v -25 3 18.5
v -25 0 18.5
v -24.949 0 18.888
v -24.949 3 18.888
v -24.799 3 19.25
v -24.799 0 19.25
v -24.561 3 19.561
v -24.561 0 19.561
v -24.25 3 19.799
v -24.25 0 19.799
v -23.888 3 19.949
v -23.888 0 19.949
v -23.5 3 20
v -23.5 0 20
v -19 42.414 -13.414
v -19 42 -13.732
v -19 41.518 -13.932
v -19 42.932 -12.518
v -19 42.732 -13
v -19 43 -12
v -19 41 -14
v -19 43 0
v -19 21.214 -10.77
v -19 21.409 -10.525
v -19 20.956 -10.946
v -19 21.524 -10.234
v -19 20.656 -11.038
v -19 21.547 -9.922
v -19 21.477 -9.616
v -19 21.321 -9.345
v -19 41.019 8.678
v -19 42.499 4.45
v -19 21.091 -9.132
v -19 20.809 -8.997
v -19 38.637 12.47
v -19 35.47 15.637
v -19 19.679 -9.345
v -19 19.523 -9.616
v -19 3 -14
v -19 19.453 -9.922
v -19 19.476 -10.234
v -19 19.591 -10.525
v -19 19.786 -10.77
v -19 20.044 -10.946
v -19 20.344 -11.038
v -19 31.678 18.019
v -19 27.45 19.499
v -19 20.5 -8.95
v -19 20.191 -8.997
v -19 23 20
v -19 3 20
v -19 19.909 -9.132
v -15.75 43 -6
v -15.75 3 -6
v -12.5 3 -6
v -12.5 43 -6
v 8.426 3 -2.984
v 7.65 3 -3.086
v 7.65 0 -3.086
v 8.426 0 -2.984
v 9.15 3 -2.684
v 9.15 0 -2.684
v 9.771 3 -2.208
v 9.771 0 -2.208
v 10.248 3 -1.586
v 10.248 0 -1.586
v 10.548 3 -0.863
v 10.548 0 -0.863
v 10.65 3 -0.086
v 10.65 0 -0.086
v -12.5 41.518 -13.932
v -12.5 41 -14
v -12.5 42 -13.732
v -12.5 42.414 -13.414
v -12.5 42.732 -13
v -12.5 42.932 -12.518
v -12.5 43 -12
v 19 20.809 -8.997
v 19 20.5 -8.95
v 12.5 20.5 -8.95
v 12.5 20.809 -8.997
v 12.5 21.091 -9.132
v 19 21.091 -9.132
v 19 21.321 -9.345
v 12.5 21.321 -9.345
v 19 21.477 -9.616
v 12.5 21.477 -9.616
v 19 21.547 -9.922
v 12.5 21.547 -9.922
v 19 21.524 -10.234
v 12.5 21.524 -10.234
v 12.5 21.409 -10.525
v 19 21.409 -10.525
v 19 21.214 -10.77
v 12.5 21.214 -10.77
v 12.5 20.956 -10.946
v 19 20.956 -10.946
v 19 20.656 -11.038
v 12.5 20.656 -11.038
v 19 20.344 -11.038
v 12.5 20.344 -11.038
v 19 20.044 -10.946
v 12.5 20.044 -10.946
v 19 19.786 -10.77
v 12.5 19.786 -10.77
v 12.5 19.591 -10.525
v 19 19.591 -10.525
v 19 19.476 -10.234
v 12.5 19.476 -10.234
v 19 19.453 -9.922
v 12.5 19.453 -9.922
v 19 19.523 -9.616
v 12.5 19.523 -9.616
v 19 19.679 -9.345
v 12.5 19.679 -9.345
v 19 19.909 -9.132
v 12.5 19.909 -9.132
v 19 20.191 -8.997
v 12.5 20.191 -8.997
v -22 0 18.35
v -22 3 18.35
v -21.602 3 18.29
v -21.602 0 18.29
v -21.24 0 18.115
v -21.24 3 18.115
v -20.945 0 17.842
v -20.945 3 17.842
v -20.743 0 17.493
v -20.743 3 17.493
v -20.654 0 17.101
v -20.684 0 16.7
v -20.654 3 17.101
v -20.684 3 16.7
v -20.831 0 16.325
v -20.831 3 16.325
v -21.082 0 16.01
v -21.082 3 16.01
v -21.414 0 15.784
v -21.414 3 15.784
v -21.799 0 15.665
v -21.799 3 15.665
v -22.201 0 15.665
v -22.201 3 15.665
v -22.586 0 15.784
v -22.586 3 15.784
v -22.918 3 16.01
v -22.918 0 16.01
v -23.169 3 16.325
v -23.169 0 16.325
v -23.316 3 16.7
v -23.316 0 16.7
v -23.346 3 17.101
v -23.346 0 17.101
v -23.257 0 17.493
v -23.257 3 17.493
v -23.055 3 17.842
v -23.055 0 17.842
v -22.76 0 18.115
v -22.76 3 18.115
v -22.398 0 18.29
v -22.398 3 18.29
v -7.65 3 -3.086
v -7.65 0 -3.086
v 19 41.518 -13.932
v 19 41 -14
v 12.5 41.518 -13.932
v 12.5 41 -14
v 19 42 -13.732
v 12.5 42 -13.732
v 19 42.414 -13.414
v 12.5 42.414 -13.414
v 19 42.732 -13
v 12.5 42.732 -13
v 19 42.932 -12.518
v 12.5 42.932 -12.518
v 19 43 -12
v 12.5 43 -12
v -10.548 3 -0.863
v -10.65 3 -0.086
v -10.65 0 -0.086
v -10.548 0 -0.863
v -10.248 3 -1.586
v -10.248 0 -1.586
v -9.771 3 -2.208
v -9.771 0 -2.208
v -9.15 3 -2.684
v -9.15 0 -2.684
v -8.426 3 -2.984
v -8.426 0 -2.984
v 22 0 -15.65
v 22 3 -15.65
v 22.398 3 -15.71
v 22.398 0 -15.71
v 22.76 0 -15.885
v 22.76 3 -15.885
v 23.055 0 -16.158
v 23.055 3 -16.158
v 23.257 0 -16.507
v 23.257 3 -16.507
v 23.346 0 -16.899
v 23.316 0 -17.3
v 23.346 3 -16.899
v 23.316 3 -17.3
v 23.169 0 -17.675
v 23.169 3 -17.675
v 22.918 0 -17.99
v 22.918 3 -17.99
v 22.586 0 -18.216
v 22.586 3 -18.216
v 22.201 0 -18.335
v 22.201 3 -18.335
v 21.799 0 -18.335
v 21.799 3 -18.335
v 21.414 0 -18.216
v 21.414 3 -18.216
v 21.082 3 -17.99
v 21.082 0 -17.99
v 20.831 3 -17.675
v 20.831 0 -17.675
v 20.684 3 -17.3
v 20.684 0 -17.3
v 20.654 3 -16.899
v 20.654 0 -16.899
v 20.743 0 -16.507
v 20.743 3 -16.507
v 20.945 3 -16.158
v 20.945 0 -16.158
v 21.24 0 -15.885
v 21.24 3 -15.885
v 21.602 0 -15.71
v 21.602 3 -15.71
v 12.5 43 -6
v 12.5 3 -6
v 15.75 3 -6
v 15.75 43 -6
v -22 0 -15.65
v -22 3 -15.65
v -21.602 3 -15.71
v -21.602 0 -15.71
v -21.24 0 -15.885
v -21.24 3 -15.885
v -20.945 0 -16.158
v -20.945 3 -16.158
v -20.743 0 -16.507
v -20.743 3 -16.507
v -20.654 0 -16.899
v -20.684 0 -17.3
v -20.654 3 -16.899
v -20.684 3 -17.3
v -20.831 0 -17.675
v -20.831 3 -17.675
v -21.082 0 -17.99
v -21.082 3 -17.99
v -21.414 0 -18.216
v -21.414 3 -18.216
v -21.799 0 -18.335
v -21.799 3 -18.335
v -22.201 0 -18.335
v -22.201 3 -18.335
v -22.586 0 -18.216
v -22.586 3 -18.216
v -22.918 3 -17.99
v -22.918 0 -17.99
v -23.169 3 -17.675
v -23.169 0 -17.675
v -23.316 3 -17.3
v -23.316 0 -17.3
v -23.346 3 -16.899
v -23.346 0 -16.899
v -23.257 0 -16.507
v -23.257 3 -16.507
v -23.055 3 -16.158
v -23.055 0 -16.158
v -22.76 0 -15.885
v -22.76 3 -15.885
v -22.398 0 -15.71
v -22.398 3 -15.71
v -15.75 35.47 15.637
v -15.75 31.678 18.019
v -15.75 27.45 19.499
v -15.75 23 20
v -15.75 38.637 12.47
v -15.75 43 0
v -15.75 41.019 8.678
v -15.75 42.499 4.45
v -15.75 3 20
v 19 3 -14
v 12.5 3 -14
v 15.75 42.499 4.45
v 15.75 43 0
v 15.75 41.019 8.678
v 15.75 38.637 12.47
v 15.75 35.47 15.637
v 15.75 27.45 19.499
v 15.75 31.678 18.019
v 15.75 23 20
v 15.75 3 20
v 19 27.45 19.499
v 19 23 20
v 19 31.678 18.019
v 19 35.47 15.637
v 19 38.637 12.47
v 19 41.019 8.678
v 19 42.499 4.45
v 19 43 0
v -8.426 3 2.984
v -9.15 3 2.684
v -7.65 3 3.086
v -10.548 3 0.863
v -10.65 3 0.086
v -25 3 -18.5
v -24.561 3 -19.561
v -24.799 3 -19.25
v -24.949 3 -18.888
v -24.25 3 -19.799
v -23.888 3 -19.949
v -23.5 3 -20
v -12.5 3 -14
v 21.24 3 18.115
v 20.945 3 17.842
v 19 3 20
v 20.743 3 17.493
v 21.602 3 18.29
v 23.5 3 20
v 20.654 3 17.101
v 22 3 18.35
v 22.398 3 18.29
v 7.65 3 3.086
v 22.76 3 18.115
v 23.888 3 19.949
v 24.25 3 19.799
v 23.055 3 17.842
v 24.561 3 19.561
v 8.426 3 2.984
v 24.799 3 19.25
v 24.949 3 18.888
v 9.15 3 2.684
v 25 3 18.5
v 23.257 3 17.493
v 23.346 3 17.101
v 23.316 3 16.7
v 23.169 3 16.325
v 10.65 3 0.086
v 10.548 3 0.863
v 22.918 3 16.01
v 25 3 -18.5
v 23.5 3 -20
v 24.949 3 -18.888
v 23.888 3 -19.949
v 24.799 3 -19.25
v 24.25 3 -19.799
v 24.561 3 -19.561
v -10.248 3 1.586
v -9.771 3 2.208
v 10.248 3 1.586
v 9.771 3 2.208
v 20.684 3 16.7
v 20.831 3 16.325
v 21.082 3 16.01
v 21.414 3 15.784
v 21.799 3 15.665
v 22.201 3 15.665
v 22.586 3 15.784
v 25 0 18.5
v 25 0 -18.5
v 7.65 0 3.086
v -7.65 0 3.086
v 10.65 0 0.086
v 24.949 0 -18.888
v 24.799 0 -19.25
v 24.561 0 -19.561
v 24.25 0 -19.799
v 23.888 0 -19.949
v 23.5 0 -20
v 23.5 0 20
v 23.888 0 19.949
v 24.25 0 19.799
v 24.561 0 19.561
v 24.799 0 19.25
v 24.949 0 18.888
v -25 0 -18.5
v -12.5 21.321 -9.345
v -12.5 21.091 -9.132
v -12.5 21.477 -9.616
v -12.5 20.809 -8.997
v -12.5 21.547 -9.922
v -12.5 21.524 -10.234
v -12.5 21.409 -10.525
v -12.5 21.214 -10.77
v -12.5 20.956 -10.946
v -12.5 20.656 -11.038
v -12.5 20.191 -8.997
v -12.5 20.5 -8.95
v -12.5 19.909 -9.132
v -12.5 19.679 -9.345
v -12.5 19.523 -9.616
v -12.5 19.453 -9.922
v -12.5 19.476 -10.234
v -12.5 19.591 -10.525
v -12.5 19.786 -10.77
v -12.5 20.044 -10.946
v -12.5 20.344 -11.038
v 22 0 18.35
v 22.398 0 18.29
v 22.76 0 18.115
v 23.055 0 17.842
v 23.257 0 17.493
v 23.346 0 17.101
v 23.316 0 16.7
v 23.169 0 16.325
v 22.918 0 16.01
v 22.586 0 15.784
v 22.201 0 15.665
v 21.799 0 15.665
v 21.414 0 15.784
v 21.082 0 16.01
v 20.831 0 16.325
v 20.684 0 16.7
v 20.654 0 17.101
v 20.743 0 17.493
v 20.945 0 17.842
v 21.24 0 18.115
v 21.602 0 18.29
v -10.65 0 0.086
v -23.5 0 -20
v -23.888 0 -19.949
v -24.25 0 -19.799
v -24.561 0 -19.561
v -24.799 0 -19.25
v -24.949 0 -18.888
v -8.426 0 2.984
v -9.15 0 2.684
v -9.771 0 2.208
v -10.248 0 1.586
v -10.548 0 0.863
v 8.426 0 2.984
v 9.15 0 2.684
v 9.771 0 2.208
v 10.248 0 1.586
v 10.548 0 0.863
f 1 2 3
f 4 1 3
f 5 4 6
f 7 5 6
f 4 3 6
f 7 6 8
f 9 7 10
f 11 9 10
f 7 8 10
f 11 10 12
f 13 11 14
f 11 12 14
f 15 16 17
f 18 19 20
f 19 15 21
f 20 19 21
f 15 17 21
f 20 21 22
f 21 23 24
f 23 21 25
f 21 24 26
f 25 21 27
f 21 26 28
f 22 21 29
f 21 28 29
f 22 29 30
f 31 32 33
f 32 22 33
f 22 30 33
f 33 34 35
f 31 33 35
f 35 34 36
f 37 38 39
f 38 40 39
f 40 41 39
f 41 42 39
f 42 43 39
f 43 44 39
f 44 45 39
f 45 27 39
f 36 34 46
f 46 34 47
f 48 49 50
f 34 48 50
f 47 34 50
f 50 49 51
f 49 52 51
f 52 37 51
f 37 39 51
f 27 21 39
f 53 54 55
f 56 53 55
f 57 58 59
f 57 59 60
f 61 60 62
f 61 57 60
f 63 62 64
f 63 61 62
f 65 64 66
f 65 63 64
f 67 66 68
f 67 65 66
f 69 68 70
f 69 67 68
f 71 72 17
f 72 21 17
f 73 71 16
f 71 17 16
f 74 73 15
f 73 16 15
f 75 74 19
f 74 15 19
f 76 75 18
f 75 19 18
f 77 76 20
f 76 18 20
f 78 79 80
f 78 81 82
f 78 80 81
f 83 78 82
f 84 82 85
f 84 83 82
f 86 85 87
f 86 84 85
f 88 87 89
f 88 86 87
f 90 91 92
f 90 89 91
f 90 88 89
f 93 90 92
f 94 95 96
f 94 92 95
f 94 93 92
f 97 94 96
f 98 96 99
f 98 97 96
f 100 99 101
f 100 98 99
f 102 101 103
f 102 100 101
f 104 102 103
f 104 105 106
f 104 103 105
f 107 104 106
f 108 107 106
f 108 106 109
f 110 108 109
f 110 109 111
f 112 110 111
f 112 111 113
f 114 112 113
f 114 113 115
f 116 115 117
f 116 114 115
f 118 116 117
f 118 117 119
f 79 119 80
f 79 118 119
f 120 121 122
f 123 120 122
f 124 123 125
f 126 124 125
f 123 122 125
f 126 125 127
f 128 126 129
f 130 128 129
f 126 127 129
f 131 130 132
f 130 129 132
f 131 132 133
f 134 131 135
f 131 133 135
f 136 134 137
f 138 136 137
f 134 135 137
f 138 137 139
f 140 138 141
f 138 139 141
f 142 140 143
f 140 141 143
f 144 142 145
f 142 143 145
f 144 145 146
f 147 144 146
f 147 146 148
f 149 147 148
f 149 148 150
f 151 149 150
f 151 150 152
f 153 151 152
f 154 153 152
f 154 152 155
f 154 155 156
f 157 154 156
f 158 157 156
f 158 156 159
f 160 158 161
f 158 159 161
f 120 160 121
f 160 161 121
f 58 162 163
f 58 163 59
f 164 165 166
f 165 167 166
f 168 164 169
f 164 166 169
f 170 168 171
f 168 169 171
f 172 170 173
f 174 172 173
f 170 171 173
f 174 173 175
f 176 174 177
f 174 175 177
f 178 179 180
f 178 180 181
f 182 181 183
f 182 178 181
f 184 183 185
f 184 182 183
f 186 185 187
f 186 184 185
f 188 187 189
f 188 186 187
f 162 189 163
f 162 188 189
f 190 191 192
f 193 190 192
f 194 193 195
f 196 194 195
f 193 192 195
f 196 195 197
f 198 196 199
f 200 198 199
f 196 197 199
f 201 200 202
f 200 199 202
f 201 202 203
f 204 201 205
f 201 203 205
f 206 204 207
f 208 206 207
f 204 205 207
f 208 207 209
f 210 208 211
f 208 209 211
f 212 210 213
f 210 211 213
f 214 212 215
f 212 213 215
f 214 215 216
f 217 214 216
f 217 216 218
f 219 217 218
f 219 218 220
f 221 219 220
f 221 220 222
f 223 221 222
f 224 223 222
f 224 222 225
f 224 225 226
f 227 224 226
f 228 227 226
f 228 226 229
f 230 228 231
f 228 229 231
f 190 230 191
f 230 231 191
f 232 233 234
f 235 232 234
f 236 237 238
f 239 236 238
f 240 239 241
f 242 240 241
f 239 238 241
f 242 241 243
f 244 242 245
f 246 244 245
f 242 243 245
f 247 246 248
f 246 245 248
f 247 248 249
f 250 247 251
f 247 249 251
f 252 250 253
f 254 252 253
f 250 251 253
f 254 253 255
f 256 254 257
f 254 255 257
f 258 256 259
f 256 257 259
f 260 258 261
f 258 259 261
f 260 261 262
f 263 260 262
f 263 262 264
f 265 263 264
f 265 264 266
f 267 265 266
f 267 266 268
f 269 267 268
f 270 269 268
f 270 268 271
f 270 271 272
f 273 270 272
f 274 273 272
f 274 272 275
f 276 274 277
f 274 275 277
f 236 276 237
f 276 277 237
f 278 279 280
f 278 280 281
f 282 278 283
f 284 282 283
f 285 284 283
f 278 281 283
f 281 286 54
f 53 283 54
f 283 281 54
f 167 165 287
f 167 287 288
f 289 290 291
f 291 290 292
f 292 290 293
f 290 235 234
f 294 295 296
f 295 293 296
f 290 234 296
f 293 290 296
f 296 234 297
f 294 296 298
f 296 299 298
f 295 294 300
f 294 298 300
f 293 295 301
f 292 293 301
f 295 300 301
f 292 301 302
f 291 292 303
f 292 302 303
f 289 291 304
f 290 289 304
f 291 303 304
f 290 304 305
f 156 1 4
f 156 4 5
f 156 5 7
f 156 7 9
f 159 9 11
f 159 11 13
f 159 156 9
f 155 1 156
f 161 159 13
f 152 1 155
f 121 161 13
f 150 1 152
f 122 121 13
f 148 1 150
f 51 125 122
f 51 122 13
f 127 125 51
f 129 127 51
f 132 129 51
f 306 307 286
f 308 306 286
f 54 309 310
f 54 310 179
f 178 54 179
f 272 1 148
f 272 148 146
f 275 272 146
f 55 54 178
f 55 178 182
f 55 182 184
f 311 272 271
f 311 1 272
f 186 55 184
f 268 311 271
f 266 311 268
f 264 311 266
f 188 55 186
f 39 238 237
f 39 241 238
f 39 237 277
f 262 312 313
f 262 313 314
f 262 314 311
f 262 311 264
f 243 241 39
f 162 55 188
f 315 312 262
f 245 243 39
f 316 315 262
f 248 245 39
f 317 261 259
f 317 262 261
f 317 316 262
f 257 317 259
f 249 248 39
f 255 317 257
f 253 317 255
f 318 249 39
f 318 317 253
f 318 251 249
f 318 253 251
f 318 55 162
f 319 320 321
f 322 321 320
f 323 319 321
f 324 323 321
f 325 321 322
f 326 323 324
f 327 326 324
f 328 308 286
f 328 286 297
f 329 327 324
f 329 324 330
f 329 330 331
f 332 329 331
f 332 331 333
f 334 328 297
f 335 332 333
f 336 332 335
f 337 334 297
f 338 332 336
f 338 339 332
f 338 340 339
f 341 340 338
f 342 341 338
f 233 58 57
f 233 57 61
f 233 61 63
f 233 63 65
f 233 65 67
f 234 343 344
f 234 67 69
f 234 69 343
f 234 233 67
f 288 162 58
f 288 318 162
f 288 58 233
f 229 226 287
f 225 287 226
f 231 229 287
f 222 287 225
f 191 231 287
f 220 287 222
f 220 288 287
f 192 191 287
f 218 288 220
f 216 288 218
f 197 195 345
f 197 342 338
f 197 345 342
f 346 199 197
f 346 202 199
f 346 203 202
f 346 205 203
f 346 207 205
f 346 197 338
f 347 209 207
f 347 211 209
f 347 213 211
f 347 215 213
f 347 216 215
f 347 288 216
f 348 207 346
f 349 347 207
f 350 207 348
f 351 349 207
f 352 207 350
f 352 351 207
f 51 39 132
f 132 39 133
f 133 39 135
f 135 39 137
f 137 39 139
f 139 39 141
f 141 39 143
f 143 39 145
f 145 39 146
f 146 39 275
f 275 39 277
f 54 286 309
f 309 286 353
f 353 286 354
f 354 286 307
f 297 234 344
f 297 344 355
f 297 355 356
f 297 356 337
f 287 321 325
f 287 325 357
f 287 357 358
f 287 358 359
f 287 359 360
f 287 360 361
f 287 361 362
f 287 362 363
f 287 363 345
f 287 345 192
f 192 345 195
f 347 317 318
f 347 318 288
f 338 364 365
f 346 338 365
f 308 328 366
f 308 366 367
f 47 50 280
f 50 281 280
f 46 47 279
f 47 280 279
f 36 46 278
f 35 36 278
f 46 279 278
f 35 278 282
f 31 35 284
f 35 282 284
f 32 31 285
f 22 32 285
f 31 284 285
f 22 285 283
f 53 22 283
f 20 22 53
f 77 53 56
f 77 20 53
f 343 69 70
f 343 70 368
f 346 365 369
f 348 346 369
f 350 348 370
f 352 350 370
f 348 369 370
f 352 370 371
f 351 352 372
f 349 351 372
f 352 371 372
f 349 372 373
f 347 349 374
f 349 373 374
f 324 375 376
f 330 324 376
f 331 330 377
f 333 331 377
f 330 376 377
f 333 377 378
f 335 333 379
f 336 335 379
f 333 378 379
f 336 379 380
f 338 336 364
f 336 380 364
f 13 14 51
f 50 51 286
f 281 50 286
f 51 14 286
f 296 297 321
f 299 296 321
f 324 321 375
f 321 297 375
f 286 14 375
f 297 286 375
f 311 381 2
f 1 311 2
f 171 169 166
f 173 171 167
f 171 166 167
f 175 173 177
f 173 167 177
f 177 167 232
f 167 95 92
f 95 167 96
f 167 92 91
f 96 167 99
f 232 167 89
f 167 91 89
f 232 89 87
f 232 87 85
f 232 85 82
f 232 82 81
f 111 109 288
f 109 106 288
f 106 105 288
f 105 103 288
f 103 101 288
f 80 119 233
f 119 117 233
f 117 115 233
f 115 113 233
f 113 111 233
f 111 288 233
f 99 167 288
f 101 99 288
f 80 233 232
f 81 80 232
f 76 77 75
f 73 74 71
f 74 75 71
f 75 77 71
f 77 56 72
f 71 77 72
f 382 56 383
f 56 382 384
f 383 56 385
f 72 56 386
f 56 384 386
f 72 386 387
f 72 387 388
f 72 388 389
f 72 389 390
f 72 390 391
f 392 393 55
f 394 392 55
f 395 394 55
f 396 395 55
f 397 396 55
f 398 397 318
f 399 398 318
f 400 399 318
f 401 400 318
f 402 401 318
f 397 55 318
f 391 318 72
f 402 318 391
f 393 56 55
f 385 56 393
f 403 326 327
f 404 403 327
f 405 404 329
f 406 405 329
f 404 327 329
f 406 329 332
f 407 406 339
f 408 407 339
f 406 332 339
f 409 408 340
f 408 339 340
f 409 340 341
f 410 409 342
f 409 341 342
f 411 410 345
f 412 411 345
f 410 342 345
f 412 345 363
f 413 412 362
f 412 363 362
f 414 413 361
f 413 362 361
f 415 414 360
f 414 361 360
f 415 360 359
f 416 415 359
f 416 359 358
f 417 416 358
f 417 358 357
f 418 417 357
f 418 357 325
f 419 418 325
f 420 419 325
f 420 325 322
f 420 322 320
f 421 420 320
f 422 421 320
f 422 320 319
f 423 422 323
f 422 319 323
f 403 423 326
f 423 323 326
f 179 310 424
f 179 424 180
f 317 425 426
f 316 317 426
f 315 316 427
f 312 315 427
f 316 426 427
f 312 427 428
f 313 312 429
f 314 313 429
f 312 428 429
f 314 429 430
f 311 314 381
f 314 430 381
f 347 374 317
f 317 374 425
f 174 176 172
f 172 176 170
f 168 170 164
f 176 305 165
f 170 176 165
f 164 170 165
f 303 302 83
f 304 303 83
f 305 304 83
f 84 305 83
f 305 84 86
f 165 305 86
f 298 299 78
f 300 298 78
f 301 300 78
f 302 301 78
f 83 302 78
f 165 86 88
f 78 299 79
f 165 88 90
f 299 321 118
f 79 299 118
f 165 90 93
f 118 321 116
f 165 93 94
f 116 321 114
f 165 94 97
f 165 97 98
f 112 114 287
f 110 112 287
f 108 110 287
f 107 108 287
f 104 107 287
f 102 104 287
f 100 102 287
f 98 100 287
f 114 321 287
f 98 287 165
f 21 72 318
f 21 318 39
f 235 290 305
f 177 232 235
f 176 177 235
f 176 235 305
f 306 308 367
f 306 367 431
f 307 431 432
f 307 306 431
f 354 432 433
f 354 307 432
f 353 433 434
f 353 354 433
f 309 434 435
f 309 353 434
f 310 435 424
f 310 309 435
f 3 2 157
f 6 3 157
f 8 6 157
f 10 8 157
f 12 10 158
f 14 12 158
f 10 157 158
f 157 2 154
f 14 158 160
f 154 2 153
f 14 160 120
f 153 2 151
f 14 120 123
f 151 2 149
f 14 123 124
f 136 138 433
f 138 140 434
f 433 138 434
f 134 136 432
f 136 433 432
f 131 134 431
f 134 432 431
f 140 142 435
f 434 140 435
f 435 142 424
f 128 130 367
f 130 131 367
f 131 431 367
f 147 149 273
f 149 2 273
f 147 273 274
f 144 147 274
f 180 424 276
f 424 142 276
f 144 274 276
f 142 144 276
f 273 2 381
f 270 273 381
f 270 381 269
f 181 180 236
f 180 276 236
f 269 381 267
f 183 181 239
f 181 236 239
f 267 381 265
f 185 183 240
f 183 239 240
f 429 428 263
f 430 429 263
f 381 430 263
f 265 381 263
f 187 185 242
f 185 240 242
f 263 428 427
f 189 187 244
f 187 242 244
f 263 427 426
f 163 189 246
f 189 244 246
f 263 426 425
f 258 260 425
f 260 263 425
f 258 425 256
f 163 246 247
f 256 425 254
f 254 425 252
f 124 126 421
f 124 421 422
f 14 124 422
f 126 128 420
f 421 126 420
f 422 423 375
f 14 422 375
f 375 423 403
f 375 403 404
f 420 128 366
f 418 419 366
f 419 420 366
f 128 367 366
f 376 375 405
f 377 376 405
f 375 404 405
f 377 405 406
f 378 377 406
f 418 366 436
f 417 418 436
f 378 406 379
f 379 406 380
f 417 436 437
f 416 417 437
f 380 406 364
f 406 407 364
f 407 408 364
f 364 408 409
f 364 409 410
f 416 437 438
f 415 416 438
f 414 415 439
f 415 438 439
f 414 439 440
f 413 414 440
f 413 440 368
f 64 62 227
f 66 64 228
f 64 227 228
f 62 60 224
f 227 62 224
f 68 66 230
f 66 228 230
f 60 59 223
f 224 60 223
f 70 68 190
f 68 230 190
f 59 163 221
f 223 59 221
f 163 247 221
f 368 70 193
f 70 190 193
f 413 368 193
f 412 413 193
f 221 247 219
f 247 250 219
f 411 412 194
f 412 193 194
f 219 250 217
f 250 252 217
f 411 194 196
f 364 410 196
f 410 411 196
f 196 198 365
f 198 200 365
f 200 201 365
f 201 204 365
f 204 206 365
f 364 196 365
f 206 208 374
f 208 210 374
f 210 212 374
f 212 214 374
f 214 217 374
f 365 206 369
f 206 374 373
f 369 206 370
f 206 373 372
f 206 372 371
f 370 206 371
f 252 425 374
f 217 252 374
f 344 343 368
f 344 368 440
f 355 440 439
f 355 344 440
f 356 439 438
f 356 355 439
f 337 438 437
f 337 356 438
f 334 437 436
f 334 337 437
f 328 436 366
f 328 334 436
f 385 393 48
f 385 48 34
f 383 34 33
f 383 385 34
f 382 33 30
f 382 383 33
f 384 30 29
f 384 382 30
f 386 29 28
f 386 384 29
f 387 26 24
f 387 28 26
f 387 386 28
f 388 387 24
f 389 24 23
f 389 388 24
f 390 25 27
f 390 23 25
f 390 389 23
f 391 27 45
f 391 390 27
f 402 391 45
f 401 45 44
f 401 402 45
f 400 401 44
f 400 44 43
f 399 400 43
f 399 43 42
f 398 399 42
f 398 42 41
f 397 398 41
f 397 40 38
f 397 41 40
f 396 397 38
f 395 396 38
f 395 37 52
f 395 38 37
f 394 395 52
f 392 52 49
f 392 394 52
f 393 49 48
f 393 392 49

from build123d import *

# Parameters (mm, degrees)
DODANIE_WYCI_GNI_CIE1_DEPTH     = 3
SZKIC2_R                        = 1.35
WYTNIJ_WYCI_GNI_CIE1_DEPTH      = 3
DODANIE_WYCI_GNI_CIE2_DEPTH     = 40
WYTNIJ_WYCI_GNI_CIE4_DEPTH      = 65.691575959
WYTNIJ_WYCI_GNI_CIE4_DEPTH_BACK = 65.691575959
SZKIC6_R                        = 1.05
ZAOKR_GLENIE8_R                 = 20
ZAOKR_GLENIE9_R                 = 20
ZAOKR_GLENIE10_R                = 2
ZAOKR_GLENIE11_R                = 2


with BuildPart() as part:
    # Szkic1 → Dodanie-wyciągnięcie1 (new body)
    with BuildSketch(Plane(origin=(0, 0, 0), x_dir=(1, 0, 0), z_dir=(0, 1, 0))):
        with BuildLine():
            Line((-23.5, -20), (23.5, -20))
            ThreePointArc((23.5, -20), (24.560660172, -19.560660172), (25, -18.5))
            Line((25, -18.5), (25, 18.5))
            ThreePointArc((25, 18.5), (24.560660172, 19.560660172), (23.5, 20))
            Line((23.5, 20), (-23.5, 20))
            ThreePointArc((-23.5, 20), (-24.560660172, 19.560660172), (-25, 18.5))
            Line((-25, 18.5), (-25, -18.5))
            ThreePointArc((-25, -18.5), (-24.560660172, -19.560660172), (-23.5, -20))
        make_face()
    extrude(amount=DODANIE_WYCI_GNI_CIE1_DEPTH)

    # Szkic2 → Wytnij-wyciągnięcie1 (cut)
    with BuildSketch(Plane(origin=(0, 3, 0), x_dir=(1, 0, 0), z_dir=(0, 1, 0))):
        with Locations(Location((-22, 17, 0), (0, 0, 270))):
            Circle(SZKIC2_R)
        with Locations(Location((22, 17, 0), (0, 0, 270))):
            Circle(SZKIC2_R)
        with Locations(Location((-22, -17, 0), (0, 0, 270))):
            Circle(SZKIC2_R)
        with Locations(Location((22, -17, 0), (0, 0, 270))):
            Circle(SZKIC2_R)
        with BuildLine():
            Line((7.65, -3.086345678), (-7.65, -3.086345678))
            ThreePointArc((-7.65, -3.086345678), (-9.771320344, -2.207666021), (-10.65, -0.086345678))
            Line((-10.65, -0.086345678), (-10.65, 0.086345678))
            ThreePointArc((-10.65, 0.086345678), (-9.771320344, 2.207666021), (-7.65, 3.086345678))
            Line((-7.65, 3.086345678), (7.65, 3.086345678))
            ThreePointArc((7.65, 3.086345678), (9.771320344, 2.207666021), (10.65, 0.086345678))
            Line((10.65, 0.086345678), (10.65, -0.086345678))
            ThreePointArc((10.65, -0.086345678), (9.771320344, -2.207666021), (7.65, -3.086345678))
        make_face()
    extrude(amount=-WYTNIJ_WYCI_GNI_CIE1_DEPTH, mode=Mode.SUBTRACT)

    # Szkic3 → Dodanie-wyciągnięcie2 (add)
    with BuildSketch(Plane(origin=(0, 3, 0), x_dir=(1, 0, 0), z_dir=(0, 1, 0))):
        Polygon((-15.75, 6), (-12.5, 6), (-12.5, 14), (-19, 14), (-19, -20), (-15.75, -20), align=None)
        Polygon((15.75, 6), (15.75, -20), (19, -20), (19, 14), (12.5, 14), (12.5, 6), align=None)
    extrude(amount=DODANIE_WYCI_GNI_CIE2_DEPTH)

    # Szkic6 → Wytnij-wyciągnięcie4 (cut, two sides: drawn at the far end of the back side and taken through both)
    with BuildSketch(Plane.ZY.offset(19).offset(-WYTNIJ_WYCI_GNI_CIE4_DEPTH_BACK)):
        with Locations((-10, 20.5)):
            Circle(SZKIC6_R)
    extrude(amount=WYTNIJ_WYCI_GNI_CIE4_DEPTH + WYTNIJ_WYCI_GNI_CIE4_DEPTH_BACK, mode=Mode.SUBTRACT)

    # Zaokrąglenie8
    zaokr_glenie8_edges = [part.edges().sort_by_distance(p)[0] for p in [
        (-17.375, 43, 20),
    ]]
    fillet(zaokr_glenie8_edges, radius=ZAOKR_GLENIE8_R)

    # Zaokrąglenie9
    zaokr_glenie9_edges = [part.edges().sort_by_distance(p)[0] for p in [
        (17.375, 43, 20),
    ]]
    fillet(zaokr_glenie9_edges, radius=ZAOKR_GLENIE9_R)

    # Zaokrąglenie10
    zaokr_glenie10_edges = [part.edges().sort_by_distance(p)[0] for p in [
        (-15.75, 43, -14),
    ]]
    fillet(zaokr_glenie10_edges, radius=ZAOKR_GLENIE10_R)

    # Zaokrąglenie11
    zaokr_glenie11_edges = [part.edges().sort_by_distance(p)[0] for p in [
        (15.75, 43, -14),
    ]]
    fillet(zaokr_glenie11_edges, radius=ZAOKR_GLENIE11_R)


solid = part.part
